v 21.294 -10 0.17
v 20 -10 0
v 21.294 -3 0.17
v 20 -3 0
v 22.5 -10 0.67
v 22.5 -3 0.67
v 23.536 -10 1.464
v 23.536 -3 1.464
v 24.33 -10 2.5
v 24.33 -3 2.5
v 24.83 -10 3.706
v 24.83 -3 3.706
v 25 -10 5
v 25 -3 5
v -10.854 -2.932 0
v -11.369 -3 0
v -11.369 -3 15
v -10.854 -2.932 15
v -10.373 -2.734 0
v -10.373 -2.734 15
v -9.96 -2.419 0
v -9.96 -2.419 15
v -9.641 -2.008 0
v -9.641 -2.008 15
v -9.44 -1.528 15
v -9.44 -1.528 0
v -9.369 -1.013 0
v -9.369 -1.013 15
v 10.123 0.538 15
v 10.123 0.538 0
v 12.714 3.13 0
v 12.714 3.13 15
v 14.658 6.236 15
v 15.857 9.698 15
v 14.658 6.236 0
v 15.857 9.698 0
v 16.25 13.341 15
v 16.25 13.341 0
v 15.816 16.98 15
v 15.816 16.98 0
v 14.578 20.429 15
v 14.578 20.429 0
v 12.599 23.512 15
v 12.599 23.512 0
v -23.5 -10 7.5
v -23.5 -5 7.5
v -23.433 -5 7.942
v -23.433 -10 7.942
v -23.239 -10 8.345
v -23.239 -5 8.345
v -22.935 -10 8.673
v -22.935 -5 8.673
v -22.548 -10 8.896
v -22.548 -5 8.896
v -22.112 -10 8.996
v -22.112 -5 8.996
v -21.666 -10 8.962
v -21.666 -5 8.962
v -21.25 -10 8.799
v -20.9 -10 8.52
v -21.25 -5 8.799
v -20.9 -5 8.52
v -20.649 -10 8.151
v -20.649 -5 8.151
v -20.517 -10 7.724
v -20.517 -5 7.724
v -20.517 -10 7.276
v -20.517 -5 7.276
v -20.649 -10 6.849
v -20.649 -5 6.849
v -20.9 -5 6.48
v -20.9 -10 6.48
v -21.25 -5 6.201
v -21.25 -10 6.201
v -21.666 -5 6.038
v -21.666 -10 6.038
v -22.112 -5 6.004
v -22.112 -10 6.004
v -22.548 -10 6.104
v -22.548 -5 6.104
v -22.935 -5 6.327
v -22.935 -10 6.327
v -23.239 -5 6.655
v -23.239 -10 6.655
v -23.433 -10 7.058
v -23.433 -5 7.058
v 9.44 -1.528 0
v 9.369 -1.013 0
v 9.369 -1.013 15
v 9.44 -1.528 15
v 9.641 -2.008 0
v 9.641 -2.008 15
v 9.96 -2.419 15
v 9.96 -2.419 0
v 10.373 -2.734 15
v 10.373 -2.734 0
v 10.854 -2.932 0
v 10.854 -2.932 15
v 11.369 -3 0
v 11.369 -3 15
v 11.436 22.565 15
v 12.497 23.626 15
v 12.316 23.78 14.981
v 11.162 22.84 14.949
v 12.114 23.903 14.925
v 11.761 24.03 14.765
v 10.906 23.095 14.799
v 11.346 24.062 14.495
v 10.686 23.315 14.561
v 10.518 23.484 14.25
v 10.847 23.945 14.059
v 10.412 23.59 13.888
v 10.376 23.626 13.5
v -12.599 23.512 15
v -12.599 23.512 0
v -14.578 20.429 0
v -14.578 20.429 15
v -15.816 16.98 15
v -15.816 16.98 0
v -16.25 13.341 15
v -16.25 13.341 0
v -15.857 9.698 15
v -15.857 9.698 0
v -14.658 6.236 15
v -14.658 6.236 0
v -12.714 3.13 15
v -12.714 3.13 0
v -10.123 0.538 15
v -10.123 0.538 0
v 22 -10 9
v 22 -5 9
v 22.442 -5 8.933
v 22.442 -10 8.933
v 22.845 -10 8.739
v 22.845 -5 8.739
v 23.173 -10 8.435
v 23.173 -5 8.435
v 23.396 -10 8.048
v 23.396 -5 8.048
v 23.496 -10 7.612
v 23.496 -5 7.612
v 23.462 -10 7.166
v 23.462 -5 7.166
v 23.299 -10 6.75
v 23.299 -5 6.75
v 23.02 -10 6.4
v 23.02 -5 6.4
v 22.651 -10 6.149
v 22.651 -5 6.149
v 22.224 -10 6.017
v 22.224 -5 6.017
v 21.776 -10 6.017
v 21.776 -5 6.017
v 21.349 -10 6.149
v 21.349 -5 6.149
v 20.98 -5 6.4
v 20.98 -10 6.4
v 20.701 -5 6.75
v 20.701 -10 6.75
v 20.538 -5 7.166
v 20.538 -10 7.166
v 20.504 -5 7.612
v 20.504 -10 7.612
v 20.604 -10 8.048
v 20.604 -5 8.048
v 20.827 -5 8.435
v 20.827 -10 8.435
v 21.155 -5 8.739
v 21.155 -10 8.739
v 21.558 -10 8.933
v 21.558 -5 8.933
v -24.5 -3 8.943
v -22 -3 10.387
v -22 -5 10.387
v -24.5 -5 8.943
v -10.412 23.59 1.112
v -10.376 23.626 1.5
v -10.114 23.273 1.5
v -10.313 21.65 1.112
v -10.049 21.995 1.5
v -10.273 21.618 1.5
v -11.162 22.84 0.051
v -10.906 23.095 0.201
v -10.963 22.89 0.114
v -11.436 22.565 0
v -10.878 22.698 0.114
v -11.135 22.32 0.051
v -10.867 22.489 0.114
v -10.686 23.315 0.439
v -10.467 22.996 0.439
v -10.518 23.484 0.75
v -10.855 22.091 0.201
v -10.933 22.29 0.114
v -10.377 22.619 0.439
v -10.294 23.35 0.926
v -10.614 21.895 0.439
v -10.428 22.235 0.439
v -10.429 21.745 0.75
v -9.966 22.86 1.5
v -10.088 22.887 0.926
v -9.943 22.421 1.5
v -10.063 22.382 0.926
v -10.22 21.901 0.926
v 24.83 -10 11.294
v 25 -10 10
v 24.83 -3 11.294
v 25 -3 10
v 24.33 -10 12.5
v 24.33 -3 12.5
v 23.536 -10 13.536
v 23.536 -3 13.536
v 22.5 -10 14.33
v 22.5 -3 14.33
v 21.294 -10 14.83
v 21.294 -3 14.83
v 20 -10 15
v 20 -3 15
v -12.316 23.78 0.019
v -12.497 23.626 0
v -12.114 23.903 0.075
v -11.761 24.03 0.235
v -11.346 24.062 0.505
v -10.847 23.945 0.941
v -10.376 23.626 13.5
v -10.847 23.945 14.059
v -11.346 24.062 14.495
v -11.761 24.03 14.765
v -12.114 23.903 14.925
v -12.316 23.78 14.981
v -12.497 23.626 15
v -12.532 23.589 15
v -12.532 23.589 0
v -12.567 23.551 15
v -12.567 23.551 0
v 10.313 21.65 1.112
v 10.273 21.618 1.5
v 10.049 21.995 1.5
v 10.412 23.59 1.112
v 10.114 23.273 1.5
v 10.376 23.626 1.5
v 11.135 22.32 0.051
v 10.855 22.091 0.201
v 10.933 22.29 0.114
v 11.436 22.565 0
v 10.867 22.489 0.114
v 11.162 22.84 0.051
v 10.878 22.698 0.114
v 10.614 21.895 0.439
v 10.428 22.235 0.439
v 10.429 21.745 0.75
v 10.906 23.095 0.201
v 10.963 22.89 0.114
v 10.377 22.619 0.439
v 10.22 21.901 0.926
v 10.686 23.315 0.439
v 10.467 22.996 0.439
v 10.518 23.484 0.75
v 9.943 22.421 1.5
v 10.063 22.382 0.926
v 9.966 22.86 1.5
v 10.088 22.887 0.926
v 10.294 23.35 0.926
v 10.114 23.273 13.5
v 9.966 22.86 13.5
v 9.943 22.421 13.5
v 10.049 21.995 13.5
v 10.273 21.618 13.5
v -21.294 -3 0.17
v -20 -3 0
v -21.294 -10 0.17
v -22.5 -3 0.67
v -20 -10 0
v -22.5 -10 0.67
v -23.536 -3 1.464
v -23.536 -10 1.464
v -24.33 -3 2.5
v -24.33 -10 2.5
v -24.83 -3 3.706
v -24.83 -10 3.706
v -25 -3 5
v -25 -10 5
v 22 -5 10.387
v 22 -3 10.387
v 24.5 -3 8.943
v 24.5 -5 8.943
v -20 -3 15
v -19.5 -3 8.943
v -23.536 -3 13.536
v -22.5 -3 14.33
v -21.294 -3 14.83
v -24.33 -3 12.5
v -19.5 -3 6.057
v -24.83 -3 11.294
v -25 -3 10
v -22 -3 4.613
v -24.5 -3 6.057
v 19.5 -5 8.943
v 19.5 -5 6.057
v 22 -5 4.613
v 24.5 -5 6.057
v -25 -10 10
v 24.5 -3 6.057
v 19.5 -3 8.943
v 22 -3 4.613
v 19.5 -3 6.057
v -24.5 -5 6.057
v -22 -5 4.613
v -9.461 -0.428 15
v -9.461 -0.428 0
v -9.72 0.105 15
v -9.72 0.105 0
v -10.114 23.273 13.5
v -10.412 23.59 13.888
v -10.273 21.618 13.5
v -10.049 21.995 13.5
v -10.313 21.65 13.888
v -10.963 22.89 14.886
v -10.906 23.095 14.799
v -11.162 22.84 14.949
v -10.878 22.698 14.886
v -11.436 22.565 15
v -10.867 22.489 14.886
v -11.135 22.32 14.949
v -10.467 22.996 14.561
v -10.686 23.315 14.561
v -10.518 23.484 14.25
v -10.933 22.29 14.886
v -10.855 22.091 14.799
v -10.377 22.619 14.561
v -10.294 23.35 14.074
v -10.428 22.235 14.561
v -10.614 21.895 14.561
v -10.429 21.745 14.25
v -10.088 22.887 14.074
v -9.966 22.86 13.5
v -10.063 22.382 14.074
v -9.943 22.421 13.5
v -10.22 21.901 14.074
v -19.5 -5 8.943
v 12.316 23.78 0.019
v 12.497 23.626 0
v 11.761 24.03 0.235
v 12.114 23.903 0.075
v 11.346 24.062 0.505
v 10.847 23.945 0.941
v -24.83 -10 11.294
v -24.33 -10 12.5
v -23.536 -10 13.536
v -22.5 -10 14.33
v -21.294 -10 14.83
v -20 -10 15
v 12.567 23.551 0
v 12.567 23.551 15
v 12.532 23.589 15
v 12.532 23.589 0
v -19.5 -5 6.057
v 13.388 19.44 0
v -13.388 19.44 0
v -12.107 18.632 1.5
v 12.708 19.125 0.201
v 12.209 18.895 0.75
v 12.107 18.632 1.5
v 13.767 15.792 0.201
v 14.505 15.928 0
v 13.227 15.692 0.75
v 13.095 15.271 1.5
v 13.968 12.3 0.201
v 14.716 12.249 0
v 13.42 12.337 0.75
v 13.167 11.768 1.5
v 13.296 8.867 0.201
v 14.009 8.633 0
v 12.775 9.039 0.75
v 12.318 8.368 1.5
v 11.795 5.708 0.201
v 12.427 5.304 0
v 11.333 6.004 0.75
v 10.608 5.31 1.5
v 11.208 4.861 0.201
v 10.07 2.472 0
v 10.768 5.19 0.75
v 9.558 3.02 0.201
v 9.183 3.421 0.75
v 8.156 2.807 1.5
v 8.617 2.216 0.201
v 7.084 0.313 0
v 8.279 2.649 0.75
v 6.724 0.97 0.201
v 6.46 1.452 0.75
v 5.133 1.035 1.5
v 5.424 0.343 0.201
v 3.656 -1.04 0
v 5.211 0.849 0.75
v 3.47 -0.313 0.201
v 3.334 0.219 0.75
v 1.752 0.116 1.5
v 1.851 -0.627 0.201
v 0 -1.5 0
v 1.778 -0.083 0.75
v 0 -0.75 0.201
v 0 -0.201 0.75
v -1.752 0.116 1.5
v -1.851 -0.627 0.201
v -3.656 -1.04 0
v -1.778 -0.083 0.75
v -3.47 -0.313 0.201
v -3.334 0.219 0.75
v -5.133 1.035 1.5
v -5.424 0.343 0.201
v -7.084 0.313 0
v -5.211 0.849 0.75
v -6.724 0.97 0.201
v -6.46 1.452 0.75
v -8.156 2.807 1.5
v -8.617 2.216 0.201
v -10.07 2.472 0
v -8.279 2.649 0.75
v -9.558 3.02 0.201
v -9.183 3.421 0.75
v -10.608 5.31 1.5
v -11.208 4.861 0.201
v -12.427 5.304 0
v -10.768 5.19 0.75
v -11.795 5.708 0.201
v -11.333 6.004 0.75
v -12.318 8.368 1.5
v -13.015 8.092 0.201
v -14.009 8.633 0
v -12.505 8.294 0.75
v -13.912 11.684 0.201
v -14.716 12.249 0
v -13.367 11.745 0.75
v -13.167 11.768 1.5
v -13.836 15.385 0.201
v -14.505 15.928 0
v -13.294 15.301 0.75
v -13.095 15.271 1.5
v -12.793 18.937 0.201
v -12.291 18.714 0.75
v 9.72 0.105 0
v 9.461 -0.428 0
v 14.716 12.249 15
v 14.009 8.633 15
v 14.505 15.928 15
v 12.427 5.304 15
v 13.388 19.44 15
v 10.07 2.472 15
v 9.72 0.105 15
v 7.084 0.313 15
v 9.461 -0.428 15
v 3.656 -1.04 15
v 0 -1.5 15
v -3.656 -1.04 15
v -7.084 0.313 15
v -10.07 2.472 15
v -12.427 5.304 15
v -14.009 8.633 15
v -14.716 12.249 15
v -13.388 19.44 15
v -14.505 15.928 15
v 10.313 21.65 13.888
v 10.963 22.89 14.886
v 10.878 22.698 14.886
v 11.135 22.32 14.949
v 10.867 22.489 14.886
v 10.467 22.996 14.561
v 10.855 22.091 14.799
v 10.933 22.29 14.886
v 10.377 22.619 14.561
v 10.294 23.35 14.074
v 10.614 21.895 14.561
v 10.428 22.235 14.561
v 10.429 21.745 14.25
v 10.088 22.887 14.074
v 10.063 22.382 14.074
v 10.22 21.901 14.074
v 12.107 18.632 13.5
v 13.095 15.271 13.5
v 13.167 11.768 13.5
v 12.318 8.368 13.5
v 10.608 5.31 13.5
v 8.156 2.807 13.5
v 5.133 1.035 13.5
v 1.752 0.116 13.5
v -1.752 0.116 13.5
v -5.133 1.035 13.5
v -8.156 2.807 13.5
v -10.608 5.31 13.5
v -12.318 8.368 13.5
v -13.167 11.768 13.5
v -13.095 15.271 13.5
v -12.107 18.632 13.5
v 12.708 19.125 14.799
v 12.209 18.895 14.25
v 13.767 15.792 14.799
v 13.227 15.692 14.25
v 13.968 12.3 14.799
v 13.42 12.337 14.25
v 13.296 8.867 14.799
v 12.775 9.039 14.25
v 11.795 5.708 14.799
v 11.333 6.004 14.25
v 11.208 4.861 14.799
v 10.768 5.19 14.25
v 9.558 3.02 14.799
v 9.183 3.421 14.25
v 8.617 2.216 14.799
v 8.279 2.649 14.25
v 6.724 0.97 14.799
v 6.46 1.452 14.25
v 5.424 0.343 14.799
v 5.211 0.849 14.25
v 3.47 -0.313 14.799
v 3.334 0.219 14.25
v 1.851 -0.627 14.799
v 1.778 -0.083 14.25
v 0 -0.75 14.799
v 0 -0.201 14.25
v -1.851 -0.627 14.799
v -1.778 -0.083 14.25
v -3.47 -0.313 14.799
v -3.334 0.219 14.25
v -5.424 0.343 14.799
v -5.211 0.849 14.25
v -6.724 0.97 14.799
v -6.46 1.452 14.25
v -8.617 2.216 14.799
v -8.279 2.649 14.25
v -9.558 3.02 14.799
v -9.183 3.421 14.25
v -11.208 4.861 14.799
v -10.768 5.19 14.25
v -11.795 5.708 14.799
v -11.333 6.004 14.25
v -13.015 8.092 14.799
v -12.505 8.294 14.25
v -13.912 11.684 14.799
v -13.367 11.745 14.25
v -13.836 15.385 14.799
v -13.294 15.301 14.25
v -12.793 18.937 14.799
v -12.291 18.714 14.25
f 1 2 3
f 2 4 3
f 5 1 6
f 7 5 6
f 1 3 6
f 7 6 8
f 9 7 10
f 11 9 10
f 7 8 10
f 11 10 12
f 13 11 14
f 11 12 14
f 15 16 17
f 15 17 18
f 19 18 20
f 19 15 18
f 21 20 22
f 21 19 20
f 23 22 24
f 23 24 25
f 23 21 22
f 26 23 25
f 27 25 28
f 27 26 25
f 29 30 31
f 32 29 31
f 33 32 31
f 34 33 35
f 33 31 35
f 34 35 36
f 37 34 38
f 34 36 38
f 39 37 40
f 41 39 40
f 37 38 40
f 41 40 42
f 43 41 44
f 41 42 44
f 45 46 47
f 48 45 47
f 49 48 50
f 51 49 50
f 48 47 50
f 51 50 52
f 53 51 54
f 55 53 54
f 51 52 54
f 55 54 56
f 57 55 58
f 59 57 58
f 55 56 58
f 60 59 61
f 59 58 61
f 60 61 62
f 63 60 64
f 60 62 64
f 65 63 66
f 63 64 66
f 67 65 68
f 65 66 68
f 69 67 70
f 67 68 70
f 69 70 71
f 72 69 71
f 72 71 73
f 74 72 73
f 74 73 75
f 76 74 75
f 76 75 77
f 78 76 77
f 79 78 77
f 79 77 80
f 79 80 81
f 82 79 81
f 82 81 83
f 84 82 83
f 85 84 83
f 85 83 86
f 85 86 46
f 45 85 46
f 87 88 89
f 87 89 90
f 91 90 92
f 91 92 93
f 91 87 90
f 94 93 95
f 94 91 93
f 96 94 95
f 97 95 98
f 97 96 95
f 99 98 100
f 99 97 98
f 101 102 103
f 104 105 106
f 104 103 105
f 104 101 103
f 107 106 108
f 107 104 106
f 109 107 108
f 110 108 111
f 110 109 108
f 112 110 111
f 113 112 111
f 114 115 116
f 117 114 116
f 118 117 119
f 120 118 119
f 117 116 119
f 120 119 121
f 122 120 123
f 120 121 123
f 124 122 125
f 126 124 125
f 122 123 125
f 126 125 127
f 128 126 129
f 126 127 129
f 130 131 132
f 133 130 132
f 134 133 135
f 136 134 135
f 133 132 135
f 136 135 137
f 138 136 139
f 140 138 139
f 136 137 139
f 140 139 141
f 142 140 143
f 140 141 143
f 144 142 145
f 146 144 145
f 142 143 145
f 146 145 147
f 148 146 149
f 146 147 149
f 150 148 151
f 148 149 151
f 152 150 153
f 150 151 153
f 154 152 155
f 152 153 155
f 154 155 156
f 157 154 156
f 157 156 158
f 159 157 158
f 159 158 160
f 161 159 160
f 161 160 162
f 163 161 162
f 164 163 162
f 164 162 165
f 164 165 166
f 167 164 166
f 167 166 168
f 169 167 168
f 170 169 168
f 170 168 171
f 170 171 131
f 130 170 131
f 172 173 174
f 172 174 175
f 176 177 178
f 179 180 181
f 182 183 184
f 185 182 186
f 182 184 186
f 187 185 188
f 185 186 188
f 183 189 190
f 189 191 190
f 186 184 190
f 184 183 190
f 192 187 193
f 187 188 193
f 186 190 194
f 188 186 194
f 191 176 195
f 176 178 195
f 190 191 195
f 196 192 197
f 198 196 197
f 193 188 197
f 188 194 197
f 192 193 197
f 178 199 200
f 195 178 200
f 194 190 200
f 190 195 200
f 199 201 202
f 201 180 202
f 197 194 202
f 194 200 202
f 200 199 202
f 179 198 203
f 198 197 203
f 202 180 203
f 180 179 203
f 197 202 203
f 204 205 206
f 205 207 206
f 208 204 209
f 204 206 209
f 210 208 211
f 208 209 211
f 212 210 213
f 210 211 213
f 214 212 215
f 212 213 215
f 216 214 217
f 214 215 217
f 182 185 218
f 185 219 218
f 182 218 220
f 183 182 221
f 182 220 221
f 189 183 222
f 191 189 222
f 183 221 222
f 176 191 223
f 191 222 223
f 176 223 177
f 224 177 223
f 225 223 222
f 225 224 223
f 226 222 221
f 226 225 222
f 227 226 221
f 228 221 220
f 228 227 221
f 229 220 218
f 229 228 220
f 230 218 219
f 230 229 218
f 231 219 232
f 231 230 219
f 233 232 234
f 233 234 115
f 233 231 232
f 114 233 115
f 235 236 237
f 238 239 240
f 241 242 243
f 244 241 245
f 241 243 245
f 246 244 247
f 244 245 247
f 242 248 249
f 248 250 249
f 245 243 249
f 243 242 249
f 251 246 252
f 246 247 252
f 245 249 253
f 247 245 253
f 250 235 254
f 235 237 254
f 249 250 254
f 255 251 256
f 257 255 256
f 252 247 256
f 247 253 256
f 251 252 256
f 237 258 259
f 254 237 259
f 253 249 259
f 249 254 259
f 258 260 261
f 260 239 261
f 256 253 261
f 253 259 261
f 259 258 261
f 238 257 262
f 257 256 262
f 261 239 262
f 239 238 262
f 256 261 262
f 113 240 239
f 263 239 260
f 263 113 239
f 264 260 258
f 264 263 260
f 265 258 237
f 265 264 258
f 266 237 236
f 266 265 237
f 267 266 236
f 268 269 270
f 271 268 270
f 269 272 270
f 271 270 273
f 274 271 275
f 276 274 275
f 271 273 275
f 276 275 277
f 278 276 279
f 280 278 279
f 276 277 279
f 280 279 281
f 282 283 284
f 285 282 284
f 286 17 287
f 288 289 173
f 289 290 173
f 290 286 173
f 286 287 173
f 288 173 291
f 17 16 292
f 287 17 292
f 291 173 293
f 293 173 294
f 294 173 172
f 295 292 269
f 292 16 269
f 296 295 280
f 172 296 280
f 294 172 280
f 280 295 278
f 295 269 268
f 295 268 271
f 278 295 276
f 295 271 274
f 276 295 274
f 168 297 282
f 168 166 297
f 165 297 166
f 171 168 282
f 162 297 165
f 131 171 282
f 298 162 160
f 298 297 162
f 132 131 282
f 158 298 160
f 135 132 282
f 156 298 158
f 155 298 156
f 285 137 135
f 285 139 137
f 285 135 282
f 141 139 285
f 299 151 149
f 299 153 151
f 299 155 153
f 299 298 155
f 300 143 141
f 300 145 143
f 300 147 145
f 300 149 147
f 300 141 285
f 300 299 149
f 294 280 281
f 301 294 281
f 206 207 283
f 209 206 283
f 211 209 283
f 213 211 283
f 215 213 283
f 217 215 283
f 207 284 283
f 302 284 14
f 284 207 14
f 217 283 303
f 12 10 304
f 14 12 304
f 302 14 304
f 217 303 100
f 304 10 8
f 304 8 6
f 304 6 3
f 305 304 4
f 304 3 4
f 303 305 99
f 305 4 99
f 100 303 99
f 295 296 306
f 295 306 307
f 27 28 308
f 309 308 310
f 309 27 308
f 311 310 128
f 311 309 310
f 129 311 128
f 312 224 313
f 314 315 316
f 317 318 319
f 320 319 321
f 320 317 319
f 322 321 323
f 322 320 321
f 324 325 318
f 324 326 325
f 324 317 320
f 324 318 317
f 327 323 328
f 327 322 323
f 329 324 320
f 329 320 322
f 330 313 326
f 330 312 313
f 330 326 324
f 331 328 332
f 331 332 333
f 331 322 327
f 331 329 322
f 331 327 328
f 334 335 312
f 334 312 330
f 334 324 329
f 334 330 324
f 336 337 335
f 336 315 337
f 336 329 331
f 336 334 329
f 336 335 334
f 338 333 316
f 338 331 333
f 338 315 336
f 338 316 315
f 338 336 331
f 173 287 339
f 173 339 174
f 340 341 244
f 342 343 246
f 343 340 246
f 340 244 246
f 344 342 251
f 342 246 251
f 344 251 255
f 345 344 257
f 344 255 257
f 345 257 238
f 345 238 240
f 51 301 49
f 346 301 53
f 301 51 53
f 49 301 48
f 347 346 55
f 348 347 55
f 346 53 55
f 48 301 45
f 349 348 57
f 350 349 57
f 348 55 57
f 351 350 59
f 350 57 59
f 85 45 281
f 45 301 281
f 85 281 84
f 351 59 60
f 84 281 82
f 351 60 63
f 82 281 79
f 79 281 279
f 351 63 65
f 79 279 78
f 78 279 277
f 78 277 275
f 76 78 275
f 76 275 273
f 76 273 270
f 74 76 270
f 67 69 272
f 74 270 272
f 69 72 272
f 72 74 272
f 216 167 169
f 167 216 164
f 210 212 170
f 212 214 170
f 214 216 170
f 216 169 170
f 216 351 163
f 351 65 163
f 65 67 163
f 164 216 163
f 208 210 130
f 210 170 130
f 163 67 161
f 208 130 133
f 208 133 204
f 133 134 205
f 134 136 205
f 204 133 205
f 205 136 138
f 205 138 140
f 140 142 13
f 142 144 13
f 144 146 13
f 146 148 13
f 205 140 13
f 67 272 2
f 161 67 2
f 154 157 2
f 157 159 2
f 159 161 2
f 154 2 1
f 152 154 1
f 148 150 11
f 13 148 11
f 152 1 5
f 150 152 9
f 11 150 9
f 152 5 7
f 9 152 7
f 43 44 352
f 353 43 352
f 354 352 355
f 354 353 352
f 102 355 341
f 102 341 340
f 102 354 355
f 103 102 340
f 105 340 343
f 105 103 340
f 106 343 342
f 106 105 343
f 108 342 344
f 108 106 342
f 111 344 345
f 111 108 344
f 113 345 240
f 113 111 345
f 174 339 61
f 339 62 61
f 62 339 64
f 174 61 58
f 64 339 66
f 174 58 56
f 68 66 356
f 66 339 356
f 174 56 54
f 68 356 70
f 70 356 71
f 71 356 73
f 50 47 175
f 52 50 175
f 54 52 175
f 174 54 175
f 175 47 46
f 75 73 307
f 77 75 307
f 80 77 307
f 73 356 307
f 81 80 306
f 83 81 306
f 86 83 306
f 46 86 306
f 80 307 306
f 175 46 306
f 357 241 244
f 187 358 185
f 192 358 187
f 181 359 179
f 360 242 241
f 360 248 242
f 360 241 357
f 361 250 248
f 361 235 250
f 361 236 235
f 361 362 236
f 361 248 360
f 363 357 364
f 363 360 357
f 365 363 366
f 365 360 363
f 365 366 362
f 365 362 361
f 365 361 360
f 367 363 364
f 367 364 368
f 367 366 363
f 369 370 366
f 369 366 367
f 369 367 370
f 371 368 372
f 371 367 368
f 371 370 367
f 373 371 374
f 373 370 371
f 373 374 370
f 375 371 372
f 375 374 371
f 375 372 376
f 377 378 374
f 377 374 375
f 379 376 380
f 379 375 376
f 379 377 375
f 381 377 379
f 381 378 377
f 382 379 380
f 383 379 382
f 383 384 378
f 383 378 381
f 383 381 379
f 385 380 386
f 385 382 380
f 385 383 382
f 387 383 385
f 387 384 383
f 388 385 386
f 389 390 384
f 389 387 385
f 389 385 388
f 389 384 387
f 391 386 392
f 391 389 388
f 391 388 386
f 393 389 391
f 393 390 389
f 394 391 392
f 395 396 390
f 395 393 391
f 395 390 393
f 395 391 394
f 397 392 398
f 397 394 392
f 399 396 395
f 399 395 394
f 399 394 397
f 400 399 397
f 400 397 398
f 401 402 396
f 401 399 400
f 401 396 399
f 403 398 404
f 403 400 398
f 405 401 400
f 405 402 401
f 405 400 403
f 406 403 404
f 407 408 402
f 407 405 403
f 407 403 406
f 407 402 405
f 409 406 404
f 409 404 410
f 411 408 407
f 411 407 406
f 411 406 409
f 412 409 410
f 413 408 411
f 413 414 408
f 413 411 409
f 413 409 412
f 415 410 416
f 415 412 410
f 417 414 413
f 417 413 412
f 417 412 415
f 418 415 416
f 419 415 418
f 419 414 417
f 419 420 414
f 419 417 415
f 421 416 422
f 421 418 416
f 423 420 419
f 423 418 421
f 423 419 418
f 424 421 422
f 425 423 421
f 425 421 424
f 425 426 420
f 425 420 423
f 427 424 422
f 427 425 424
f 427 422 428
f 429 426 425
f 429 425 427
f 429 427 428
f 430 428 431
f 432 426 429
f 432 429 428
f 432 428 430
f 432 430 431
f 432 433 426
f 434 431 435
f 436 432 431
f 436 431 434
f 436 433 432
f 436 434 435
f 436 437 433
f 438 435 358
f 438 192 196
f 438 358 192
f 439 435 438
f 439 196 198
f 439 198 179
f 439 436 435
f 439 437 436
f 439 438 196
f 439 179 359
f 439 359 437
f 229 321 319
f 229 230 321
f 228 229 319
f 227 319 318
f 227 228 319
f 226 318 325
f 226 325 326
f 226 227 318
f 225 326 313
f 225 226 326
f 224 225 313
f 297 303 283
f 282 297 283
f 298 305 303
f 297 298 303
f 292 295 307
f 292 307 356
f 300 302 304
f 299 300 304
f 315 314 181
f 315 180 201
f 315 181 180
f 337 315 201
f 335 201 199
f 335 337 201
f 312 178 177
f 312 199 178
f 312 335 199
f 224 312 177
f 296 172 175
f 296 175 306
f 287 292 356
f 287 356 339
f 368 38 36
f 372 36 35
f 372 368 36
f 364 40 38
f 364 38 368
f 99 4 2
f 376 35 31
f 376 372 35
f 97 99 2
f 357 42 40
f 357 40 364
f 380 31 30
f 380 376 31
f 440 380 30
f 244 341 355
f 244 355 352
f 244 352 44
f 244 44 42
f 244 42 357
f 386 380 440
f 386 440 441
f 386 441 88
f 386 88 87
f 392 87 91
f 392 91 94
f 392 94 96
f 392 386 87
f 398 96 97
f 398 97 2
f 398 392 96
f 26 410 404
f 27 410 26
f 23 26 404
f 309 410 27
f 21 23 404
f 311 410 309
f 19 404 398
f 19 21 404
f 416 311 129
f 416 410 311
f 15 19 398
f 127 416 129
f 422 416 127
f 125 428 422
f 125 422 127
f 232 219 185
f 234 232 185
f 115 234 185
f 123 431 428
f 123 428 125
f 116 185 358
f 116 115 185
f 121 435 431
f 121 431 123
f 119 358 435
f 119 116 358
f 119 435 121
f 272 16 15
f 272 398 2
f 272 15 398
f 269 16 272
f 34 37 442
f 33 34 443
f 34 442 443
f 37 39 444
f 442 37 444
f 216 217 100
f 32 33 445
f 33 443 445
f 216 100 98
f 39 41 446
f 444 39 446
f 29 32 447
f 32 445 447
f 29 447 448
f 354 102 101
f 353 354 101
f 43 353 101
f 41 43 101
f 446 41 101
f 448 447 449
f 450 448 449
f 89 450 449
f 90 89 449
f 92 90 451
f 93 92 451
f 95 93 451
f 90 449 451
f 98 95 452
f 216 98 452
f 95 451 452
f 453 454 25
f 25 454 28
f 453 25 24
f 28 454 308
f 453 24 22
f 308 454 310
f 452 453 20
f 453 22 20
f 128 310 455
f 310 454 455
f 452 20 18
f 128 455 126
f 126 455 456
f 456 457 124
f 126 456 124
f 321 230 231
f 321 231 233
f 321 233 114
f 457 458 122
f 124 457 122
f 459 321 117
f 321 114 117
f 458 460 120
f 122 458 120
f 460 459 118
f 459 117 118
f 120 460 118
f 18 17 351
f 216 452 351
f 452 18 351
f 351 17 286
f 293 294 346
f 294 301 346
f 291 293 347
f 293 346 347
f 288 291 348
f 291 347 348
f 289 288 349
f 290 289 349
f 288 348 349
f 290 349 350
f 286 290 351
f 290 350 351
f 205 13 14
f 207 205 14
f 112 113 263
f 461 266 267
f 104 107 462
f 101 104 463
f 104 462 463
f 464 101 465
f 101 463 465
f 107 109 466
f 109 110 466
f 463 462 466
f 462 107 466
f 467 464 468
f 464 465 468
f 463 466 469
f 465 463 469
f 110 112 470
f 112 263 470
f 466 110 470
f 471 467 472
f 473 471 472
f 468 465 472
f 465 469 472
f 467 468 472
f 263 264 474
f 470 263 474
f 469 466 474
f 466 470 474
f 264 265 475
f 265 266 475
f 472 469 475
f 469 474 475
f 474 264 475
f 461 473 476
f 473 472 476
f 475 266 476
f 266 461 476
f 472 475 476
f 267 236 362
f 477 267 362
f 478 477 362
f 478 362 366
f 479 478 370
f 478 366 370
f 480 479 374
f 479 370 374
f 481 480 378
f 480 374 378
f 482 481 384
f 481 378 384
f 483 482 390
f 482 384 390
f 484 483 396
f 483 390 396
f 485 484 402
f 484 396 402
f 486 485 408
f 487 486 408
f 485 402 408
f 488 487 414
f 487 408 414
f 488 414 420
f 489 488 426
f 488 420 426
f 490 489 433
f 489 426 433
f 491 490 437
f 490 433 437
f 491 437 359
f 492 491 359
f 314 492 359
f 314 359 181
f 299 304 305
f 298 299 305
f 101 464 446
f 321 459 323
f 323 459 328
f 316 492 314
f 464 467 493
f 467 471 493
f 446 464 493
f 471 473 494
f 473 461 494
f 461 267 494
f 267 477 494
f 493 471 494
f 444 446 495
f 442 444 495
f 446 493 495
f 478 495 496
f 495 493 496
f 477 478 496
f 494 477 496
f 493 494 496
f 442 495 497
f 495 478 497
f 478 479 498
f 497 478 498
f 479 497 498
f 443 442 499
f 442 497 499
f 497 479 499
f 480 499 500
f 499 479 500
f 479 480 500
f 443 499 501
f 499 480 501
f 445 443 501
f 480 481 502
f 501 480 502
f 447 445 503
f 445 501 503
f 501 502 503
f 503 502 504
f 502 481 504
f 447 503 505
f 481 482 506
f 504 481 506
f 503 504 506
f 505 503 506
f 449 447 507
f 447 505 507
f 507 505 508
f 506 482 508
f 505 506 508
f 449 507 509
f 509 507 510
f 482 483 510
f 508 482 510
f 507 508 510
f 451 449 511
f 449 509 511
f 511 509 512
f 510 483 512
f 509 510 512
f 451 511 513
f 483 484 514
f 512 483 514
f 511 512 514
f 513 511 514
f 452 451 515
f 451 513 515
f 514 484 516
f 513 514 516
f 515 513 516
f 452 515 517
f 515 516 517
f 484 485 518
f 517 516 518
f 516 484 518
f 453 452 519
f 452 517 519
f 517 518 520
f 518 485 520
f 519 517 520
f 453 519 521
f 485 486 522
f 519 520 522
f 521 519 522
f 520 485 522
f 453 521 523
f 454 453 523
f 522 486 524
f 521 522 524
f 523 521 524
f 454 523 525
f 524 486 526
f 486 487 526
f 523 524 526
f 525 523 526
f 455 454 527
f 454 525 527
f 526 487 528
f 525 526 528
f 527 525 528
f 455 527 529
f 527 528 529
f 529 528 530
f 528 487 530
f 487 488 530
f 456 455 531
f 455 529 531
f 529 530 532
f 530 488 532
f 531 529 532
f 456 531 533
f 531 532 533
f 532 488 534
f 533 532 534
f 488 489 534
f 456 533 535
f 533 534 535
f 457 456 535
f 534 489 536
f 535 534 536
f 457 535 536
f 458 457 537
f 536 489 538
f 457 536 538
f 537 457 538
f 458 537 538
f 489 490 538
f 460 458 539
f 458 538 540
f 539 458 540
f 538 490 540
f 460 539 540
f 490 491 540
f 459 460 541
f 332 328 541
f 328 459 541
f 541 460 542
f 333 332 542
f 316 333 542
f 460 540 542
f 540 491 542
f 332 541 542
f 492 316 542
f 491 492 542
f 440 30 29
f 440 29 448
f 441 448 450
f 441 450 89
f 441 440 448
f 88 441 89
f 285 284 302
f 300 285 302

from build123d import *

# Parameters (mm, degrees)
RESSALTO_EXTRUS_O1_DEPTH = 15
ESBO_O3_R                = 1.5
CORTE_EXTRUS_O1_DEPTH    = 7
CORTE_EXTRUS_O2_DEPTH    = 2
FILETE1_R                = 1.5
FILETE2_R                = 2
FILETE3_R                = 5


# Some blends are built 0.0001 mm under size
with BuildPart() as part:
    # Esboço2 → Ressalto-extrusão1 (new body)
    with BuildSketch(Plane.XY):
        with BuildLine():
            Line((-25, -3), (-25, -10))
            Line((-25, -10), (25, -10))
            Line((25, -10), (25, -3))
            Line((25, -3), (9.369164851, -3))
            Line((9.369164851, -3), (9.369164851, -0.027094938))
            ThreePointArc((9.369164851, -0.027094938), (16.19072285, 11.863279554), (11.490485194, 24.740485194))
            Line((11.490485194, 24.740485194), (9.369164851, 22.619164851))
            ThreePointArc((9.369164851, 22.619164851), (0, 0), (-9.369164851, 22.619164851))
            Line((-9.369164851, 22.619164851), (-11.490485194, 24.740485194))
            ThreePointArc((-11.490485194, 24.740485194), (-16.19072285, 11.863279554), (-9.369164851, -0.027094938))
            Line((-9.369164851, -0.027094938), (-9.369164851, -3))
            Line((-9.369164851, -3), (-25, -3))
        make_face()
    extrude(amount=RESSALTO_EXTRUS_O1_DEPTH)

    # Esboço3 → Corte-extrusão1 (cut)
    with BuildSketch(Plane(origin=(0, -3, 0), x_dir=(1, 0, 0), z_dir=(0, 1, 0))):
        with Locations(Location((22, -7.5, 0), (0, 0, 270))):
            Circle(ESBO_O3_R)
        with Locations(Location((-22, -7.5, 0), (0, 0, 180))):
            Circle(ESBO_O3_R)
    extrude(amount=-CORTE_EXTRUS_O1_DEPTH, mode=Mode.SUBTRACT)

    # Esboço5 → Corte-extrusão2 (cut)
    with BuildSketch(Plane(origin=(0, -3, 0), x_dir=(1, 0, 0), z_dir=(0, 1, 0))):
        Polygon((22, -4.613248654), (19.5, -6.056624327), (19.5, -8.943375673), (22, -10.386751346), (24.5, -8.943375673), (24.5, -6.056624327), align=None)
        Polygon((-24.5, -6.056624327), (-22, -4.613248654), (-19.5, -6.056624327), (-19.5, -8.943375673), (-22, -10.386751346), (-24.5, -8.943375673), align=None)
    extrude(amount=-CORTE_EXTRUS_O2_DEPTH, mode=Mode.SUBTRACT)

    # Filete1
    filete1_edges = [part.edges().sort_by_distance(p)[0] for p in [
        (10.429825023, 23.679825023, 15),
        (-10.429825023, 23.679825023, 0),
        (0, 0, 0),
        (10.429825023, 23.679825023, 0),
        (0, 0, 15),
        (-11.490485194, 24.740485194, 7.5),
        (-9.369164851, 22.619164851, 7.5),
        (9.369164851, 22.619164851, 7.5),
        (11.490485194, 24.740485194, 7.5),
        (-10.429825023, 23.679825023, 15),
    ]]
    fillet(filete1_edges, radius=FILETE1_R - 0.0001)  # a hair under: the kernel refuses the full size

    # Filete2
    # the kernel refuses this fillet: 2 mm, written as the material it adds along each edge
    with BuildSketch(Plane(origin=(9.369164851, -0.027094938, 0), x_dir=(0.7999862174060132, 0.600018376352274, 0), z_dir=(0, 0, 1))) as filete2_piece_1:
        with BuildLine():
            CenterArc((1.000602329, -1.999158651), FILETE2_R, 91.661980606, 51.466805628)
            Line((-0.599370106, -0.799121898), (0, 0))
            ThreePointArc((0, 0), (0.471298198, -0.006835961), (0.942596397, 0))
        make_face()
    extrude(amount=15)
    with BuildSketch(Plane(origin=(9.369164851, -3, 0), x_dir=(0, 1, 0), z_dir=(0, 0, 1)), Plane(origin=(-9.369164851, -3, 0), x_dir=(-1, 0, 0), z_dir=(0, 0, 1))) as filete2_piece_2:
        with BuildLine():
            CenterArc((FILETE2_R, -FILETE2_R), FILETE2_R, 90, 90)
            Line((0, -FILETE2_R), (0, 0))
            Line((0, 0), (FILETE2_R, 0))
        make_face()
    extrude(amount=15)
    with BuildSketch(Plane(origin=(-9.369164851, -0.027094938, 0), x_dir=(-0.799986217406012, 0.6000183763522756, 0), z_dir=(0, 0, 1))) as filete2_piece_3:
        with BuildLine():
            CenterArc((1.000602329, 1.999158651), FILETE2_R, 216.871213766, 51.466805628)
            Line((-0.599370106, 0.799121898), (0, 0))
            ThreePointArc((0, 0), (0.471298198, 0.006835961), (0.942596397, 0))
        make_face()
    extrude(amount=15)

    # Filete3
    filete3_edges = [part.edges().sort_by_distance(p)[0] for p in [
        (25, -6.5, 0),
        (-25, -6.5, 0),
        (-25, -6.5, 15),
        (25, -6.5, 15),
    ]]
    fillet(filete3_edges, radius=FILETE3_R)


solid = part.part
